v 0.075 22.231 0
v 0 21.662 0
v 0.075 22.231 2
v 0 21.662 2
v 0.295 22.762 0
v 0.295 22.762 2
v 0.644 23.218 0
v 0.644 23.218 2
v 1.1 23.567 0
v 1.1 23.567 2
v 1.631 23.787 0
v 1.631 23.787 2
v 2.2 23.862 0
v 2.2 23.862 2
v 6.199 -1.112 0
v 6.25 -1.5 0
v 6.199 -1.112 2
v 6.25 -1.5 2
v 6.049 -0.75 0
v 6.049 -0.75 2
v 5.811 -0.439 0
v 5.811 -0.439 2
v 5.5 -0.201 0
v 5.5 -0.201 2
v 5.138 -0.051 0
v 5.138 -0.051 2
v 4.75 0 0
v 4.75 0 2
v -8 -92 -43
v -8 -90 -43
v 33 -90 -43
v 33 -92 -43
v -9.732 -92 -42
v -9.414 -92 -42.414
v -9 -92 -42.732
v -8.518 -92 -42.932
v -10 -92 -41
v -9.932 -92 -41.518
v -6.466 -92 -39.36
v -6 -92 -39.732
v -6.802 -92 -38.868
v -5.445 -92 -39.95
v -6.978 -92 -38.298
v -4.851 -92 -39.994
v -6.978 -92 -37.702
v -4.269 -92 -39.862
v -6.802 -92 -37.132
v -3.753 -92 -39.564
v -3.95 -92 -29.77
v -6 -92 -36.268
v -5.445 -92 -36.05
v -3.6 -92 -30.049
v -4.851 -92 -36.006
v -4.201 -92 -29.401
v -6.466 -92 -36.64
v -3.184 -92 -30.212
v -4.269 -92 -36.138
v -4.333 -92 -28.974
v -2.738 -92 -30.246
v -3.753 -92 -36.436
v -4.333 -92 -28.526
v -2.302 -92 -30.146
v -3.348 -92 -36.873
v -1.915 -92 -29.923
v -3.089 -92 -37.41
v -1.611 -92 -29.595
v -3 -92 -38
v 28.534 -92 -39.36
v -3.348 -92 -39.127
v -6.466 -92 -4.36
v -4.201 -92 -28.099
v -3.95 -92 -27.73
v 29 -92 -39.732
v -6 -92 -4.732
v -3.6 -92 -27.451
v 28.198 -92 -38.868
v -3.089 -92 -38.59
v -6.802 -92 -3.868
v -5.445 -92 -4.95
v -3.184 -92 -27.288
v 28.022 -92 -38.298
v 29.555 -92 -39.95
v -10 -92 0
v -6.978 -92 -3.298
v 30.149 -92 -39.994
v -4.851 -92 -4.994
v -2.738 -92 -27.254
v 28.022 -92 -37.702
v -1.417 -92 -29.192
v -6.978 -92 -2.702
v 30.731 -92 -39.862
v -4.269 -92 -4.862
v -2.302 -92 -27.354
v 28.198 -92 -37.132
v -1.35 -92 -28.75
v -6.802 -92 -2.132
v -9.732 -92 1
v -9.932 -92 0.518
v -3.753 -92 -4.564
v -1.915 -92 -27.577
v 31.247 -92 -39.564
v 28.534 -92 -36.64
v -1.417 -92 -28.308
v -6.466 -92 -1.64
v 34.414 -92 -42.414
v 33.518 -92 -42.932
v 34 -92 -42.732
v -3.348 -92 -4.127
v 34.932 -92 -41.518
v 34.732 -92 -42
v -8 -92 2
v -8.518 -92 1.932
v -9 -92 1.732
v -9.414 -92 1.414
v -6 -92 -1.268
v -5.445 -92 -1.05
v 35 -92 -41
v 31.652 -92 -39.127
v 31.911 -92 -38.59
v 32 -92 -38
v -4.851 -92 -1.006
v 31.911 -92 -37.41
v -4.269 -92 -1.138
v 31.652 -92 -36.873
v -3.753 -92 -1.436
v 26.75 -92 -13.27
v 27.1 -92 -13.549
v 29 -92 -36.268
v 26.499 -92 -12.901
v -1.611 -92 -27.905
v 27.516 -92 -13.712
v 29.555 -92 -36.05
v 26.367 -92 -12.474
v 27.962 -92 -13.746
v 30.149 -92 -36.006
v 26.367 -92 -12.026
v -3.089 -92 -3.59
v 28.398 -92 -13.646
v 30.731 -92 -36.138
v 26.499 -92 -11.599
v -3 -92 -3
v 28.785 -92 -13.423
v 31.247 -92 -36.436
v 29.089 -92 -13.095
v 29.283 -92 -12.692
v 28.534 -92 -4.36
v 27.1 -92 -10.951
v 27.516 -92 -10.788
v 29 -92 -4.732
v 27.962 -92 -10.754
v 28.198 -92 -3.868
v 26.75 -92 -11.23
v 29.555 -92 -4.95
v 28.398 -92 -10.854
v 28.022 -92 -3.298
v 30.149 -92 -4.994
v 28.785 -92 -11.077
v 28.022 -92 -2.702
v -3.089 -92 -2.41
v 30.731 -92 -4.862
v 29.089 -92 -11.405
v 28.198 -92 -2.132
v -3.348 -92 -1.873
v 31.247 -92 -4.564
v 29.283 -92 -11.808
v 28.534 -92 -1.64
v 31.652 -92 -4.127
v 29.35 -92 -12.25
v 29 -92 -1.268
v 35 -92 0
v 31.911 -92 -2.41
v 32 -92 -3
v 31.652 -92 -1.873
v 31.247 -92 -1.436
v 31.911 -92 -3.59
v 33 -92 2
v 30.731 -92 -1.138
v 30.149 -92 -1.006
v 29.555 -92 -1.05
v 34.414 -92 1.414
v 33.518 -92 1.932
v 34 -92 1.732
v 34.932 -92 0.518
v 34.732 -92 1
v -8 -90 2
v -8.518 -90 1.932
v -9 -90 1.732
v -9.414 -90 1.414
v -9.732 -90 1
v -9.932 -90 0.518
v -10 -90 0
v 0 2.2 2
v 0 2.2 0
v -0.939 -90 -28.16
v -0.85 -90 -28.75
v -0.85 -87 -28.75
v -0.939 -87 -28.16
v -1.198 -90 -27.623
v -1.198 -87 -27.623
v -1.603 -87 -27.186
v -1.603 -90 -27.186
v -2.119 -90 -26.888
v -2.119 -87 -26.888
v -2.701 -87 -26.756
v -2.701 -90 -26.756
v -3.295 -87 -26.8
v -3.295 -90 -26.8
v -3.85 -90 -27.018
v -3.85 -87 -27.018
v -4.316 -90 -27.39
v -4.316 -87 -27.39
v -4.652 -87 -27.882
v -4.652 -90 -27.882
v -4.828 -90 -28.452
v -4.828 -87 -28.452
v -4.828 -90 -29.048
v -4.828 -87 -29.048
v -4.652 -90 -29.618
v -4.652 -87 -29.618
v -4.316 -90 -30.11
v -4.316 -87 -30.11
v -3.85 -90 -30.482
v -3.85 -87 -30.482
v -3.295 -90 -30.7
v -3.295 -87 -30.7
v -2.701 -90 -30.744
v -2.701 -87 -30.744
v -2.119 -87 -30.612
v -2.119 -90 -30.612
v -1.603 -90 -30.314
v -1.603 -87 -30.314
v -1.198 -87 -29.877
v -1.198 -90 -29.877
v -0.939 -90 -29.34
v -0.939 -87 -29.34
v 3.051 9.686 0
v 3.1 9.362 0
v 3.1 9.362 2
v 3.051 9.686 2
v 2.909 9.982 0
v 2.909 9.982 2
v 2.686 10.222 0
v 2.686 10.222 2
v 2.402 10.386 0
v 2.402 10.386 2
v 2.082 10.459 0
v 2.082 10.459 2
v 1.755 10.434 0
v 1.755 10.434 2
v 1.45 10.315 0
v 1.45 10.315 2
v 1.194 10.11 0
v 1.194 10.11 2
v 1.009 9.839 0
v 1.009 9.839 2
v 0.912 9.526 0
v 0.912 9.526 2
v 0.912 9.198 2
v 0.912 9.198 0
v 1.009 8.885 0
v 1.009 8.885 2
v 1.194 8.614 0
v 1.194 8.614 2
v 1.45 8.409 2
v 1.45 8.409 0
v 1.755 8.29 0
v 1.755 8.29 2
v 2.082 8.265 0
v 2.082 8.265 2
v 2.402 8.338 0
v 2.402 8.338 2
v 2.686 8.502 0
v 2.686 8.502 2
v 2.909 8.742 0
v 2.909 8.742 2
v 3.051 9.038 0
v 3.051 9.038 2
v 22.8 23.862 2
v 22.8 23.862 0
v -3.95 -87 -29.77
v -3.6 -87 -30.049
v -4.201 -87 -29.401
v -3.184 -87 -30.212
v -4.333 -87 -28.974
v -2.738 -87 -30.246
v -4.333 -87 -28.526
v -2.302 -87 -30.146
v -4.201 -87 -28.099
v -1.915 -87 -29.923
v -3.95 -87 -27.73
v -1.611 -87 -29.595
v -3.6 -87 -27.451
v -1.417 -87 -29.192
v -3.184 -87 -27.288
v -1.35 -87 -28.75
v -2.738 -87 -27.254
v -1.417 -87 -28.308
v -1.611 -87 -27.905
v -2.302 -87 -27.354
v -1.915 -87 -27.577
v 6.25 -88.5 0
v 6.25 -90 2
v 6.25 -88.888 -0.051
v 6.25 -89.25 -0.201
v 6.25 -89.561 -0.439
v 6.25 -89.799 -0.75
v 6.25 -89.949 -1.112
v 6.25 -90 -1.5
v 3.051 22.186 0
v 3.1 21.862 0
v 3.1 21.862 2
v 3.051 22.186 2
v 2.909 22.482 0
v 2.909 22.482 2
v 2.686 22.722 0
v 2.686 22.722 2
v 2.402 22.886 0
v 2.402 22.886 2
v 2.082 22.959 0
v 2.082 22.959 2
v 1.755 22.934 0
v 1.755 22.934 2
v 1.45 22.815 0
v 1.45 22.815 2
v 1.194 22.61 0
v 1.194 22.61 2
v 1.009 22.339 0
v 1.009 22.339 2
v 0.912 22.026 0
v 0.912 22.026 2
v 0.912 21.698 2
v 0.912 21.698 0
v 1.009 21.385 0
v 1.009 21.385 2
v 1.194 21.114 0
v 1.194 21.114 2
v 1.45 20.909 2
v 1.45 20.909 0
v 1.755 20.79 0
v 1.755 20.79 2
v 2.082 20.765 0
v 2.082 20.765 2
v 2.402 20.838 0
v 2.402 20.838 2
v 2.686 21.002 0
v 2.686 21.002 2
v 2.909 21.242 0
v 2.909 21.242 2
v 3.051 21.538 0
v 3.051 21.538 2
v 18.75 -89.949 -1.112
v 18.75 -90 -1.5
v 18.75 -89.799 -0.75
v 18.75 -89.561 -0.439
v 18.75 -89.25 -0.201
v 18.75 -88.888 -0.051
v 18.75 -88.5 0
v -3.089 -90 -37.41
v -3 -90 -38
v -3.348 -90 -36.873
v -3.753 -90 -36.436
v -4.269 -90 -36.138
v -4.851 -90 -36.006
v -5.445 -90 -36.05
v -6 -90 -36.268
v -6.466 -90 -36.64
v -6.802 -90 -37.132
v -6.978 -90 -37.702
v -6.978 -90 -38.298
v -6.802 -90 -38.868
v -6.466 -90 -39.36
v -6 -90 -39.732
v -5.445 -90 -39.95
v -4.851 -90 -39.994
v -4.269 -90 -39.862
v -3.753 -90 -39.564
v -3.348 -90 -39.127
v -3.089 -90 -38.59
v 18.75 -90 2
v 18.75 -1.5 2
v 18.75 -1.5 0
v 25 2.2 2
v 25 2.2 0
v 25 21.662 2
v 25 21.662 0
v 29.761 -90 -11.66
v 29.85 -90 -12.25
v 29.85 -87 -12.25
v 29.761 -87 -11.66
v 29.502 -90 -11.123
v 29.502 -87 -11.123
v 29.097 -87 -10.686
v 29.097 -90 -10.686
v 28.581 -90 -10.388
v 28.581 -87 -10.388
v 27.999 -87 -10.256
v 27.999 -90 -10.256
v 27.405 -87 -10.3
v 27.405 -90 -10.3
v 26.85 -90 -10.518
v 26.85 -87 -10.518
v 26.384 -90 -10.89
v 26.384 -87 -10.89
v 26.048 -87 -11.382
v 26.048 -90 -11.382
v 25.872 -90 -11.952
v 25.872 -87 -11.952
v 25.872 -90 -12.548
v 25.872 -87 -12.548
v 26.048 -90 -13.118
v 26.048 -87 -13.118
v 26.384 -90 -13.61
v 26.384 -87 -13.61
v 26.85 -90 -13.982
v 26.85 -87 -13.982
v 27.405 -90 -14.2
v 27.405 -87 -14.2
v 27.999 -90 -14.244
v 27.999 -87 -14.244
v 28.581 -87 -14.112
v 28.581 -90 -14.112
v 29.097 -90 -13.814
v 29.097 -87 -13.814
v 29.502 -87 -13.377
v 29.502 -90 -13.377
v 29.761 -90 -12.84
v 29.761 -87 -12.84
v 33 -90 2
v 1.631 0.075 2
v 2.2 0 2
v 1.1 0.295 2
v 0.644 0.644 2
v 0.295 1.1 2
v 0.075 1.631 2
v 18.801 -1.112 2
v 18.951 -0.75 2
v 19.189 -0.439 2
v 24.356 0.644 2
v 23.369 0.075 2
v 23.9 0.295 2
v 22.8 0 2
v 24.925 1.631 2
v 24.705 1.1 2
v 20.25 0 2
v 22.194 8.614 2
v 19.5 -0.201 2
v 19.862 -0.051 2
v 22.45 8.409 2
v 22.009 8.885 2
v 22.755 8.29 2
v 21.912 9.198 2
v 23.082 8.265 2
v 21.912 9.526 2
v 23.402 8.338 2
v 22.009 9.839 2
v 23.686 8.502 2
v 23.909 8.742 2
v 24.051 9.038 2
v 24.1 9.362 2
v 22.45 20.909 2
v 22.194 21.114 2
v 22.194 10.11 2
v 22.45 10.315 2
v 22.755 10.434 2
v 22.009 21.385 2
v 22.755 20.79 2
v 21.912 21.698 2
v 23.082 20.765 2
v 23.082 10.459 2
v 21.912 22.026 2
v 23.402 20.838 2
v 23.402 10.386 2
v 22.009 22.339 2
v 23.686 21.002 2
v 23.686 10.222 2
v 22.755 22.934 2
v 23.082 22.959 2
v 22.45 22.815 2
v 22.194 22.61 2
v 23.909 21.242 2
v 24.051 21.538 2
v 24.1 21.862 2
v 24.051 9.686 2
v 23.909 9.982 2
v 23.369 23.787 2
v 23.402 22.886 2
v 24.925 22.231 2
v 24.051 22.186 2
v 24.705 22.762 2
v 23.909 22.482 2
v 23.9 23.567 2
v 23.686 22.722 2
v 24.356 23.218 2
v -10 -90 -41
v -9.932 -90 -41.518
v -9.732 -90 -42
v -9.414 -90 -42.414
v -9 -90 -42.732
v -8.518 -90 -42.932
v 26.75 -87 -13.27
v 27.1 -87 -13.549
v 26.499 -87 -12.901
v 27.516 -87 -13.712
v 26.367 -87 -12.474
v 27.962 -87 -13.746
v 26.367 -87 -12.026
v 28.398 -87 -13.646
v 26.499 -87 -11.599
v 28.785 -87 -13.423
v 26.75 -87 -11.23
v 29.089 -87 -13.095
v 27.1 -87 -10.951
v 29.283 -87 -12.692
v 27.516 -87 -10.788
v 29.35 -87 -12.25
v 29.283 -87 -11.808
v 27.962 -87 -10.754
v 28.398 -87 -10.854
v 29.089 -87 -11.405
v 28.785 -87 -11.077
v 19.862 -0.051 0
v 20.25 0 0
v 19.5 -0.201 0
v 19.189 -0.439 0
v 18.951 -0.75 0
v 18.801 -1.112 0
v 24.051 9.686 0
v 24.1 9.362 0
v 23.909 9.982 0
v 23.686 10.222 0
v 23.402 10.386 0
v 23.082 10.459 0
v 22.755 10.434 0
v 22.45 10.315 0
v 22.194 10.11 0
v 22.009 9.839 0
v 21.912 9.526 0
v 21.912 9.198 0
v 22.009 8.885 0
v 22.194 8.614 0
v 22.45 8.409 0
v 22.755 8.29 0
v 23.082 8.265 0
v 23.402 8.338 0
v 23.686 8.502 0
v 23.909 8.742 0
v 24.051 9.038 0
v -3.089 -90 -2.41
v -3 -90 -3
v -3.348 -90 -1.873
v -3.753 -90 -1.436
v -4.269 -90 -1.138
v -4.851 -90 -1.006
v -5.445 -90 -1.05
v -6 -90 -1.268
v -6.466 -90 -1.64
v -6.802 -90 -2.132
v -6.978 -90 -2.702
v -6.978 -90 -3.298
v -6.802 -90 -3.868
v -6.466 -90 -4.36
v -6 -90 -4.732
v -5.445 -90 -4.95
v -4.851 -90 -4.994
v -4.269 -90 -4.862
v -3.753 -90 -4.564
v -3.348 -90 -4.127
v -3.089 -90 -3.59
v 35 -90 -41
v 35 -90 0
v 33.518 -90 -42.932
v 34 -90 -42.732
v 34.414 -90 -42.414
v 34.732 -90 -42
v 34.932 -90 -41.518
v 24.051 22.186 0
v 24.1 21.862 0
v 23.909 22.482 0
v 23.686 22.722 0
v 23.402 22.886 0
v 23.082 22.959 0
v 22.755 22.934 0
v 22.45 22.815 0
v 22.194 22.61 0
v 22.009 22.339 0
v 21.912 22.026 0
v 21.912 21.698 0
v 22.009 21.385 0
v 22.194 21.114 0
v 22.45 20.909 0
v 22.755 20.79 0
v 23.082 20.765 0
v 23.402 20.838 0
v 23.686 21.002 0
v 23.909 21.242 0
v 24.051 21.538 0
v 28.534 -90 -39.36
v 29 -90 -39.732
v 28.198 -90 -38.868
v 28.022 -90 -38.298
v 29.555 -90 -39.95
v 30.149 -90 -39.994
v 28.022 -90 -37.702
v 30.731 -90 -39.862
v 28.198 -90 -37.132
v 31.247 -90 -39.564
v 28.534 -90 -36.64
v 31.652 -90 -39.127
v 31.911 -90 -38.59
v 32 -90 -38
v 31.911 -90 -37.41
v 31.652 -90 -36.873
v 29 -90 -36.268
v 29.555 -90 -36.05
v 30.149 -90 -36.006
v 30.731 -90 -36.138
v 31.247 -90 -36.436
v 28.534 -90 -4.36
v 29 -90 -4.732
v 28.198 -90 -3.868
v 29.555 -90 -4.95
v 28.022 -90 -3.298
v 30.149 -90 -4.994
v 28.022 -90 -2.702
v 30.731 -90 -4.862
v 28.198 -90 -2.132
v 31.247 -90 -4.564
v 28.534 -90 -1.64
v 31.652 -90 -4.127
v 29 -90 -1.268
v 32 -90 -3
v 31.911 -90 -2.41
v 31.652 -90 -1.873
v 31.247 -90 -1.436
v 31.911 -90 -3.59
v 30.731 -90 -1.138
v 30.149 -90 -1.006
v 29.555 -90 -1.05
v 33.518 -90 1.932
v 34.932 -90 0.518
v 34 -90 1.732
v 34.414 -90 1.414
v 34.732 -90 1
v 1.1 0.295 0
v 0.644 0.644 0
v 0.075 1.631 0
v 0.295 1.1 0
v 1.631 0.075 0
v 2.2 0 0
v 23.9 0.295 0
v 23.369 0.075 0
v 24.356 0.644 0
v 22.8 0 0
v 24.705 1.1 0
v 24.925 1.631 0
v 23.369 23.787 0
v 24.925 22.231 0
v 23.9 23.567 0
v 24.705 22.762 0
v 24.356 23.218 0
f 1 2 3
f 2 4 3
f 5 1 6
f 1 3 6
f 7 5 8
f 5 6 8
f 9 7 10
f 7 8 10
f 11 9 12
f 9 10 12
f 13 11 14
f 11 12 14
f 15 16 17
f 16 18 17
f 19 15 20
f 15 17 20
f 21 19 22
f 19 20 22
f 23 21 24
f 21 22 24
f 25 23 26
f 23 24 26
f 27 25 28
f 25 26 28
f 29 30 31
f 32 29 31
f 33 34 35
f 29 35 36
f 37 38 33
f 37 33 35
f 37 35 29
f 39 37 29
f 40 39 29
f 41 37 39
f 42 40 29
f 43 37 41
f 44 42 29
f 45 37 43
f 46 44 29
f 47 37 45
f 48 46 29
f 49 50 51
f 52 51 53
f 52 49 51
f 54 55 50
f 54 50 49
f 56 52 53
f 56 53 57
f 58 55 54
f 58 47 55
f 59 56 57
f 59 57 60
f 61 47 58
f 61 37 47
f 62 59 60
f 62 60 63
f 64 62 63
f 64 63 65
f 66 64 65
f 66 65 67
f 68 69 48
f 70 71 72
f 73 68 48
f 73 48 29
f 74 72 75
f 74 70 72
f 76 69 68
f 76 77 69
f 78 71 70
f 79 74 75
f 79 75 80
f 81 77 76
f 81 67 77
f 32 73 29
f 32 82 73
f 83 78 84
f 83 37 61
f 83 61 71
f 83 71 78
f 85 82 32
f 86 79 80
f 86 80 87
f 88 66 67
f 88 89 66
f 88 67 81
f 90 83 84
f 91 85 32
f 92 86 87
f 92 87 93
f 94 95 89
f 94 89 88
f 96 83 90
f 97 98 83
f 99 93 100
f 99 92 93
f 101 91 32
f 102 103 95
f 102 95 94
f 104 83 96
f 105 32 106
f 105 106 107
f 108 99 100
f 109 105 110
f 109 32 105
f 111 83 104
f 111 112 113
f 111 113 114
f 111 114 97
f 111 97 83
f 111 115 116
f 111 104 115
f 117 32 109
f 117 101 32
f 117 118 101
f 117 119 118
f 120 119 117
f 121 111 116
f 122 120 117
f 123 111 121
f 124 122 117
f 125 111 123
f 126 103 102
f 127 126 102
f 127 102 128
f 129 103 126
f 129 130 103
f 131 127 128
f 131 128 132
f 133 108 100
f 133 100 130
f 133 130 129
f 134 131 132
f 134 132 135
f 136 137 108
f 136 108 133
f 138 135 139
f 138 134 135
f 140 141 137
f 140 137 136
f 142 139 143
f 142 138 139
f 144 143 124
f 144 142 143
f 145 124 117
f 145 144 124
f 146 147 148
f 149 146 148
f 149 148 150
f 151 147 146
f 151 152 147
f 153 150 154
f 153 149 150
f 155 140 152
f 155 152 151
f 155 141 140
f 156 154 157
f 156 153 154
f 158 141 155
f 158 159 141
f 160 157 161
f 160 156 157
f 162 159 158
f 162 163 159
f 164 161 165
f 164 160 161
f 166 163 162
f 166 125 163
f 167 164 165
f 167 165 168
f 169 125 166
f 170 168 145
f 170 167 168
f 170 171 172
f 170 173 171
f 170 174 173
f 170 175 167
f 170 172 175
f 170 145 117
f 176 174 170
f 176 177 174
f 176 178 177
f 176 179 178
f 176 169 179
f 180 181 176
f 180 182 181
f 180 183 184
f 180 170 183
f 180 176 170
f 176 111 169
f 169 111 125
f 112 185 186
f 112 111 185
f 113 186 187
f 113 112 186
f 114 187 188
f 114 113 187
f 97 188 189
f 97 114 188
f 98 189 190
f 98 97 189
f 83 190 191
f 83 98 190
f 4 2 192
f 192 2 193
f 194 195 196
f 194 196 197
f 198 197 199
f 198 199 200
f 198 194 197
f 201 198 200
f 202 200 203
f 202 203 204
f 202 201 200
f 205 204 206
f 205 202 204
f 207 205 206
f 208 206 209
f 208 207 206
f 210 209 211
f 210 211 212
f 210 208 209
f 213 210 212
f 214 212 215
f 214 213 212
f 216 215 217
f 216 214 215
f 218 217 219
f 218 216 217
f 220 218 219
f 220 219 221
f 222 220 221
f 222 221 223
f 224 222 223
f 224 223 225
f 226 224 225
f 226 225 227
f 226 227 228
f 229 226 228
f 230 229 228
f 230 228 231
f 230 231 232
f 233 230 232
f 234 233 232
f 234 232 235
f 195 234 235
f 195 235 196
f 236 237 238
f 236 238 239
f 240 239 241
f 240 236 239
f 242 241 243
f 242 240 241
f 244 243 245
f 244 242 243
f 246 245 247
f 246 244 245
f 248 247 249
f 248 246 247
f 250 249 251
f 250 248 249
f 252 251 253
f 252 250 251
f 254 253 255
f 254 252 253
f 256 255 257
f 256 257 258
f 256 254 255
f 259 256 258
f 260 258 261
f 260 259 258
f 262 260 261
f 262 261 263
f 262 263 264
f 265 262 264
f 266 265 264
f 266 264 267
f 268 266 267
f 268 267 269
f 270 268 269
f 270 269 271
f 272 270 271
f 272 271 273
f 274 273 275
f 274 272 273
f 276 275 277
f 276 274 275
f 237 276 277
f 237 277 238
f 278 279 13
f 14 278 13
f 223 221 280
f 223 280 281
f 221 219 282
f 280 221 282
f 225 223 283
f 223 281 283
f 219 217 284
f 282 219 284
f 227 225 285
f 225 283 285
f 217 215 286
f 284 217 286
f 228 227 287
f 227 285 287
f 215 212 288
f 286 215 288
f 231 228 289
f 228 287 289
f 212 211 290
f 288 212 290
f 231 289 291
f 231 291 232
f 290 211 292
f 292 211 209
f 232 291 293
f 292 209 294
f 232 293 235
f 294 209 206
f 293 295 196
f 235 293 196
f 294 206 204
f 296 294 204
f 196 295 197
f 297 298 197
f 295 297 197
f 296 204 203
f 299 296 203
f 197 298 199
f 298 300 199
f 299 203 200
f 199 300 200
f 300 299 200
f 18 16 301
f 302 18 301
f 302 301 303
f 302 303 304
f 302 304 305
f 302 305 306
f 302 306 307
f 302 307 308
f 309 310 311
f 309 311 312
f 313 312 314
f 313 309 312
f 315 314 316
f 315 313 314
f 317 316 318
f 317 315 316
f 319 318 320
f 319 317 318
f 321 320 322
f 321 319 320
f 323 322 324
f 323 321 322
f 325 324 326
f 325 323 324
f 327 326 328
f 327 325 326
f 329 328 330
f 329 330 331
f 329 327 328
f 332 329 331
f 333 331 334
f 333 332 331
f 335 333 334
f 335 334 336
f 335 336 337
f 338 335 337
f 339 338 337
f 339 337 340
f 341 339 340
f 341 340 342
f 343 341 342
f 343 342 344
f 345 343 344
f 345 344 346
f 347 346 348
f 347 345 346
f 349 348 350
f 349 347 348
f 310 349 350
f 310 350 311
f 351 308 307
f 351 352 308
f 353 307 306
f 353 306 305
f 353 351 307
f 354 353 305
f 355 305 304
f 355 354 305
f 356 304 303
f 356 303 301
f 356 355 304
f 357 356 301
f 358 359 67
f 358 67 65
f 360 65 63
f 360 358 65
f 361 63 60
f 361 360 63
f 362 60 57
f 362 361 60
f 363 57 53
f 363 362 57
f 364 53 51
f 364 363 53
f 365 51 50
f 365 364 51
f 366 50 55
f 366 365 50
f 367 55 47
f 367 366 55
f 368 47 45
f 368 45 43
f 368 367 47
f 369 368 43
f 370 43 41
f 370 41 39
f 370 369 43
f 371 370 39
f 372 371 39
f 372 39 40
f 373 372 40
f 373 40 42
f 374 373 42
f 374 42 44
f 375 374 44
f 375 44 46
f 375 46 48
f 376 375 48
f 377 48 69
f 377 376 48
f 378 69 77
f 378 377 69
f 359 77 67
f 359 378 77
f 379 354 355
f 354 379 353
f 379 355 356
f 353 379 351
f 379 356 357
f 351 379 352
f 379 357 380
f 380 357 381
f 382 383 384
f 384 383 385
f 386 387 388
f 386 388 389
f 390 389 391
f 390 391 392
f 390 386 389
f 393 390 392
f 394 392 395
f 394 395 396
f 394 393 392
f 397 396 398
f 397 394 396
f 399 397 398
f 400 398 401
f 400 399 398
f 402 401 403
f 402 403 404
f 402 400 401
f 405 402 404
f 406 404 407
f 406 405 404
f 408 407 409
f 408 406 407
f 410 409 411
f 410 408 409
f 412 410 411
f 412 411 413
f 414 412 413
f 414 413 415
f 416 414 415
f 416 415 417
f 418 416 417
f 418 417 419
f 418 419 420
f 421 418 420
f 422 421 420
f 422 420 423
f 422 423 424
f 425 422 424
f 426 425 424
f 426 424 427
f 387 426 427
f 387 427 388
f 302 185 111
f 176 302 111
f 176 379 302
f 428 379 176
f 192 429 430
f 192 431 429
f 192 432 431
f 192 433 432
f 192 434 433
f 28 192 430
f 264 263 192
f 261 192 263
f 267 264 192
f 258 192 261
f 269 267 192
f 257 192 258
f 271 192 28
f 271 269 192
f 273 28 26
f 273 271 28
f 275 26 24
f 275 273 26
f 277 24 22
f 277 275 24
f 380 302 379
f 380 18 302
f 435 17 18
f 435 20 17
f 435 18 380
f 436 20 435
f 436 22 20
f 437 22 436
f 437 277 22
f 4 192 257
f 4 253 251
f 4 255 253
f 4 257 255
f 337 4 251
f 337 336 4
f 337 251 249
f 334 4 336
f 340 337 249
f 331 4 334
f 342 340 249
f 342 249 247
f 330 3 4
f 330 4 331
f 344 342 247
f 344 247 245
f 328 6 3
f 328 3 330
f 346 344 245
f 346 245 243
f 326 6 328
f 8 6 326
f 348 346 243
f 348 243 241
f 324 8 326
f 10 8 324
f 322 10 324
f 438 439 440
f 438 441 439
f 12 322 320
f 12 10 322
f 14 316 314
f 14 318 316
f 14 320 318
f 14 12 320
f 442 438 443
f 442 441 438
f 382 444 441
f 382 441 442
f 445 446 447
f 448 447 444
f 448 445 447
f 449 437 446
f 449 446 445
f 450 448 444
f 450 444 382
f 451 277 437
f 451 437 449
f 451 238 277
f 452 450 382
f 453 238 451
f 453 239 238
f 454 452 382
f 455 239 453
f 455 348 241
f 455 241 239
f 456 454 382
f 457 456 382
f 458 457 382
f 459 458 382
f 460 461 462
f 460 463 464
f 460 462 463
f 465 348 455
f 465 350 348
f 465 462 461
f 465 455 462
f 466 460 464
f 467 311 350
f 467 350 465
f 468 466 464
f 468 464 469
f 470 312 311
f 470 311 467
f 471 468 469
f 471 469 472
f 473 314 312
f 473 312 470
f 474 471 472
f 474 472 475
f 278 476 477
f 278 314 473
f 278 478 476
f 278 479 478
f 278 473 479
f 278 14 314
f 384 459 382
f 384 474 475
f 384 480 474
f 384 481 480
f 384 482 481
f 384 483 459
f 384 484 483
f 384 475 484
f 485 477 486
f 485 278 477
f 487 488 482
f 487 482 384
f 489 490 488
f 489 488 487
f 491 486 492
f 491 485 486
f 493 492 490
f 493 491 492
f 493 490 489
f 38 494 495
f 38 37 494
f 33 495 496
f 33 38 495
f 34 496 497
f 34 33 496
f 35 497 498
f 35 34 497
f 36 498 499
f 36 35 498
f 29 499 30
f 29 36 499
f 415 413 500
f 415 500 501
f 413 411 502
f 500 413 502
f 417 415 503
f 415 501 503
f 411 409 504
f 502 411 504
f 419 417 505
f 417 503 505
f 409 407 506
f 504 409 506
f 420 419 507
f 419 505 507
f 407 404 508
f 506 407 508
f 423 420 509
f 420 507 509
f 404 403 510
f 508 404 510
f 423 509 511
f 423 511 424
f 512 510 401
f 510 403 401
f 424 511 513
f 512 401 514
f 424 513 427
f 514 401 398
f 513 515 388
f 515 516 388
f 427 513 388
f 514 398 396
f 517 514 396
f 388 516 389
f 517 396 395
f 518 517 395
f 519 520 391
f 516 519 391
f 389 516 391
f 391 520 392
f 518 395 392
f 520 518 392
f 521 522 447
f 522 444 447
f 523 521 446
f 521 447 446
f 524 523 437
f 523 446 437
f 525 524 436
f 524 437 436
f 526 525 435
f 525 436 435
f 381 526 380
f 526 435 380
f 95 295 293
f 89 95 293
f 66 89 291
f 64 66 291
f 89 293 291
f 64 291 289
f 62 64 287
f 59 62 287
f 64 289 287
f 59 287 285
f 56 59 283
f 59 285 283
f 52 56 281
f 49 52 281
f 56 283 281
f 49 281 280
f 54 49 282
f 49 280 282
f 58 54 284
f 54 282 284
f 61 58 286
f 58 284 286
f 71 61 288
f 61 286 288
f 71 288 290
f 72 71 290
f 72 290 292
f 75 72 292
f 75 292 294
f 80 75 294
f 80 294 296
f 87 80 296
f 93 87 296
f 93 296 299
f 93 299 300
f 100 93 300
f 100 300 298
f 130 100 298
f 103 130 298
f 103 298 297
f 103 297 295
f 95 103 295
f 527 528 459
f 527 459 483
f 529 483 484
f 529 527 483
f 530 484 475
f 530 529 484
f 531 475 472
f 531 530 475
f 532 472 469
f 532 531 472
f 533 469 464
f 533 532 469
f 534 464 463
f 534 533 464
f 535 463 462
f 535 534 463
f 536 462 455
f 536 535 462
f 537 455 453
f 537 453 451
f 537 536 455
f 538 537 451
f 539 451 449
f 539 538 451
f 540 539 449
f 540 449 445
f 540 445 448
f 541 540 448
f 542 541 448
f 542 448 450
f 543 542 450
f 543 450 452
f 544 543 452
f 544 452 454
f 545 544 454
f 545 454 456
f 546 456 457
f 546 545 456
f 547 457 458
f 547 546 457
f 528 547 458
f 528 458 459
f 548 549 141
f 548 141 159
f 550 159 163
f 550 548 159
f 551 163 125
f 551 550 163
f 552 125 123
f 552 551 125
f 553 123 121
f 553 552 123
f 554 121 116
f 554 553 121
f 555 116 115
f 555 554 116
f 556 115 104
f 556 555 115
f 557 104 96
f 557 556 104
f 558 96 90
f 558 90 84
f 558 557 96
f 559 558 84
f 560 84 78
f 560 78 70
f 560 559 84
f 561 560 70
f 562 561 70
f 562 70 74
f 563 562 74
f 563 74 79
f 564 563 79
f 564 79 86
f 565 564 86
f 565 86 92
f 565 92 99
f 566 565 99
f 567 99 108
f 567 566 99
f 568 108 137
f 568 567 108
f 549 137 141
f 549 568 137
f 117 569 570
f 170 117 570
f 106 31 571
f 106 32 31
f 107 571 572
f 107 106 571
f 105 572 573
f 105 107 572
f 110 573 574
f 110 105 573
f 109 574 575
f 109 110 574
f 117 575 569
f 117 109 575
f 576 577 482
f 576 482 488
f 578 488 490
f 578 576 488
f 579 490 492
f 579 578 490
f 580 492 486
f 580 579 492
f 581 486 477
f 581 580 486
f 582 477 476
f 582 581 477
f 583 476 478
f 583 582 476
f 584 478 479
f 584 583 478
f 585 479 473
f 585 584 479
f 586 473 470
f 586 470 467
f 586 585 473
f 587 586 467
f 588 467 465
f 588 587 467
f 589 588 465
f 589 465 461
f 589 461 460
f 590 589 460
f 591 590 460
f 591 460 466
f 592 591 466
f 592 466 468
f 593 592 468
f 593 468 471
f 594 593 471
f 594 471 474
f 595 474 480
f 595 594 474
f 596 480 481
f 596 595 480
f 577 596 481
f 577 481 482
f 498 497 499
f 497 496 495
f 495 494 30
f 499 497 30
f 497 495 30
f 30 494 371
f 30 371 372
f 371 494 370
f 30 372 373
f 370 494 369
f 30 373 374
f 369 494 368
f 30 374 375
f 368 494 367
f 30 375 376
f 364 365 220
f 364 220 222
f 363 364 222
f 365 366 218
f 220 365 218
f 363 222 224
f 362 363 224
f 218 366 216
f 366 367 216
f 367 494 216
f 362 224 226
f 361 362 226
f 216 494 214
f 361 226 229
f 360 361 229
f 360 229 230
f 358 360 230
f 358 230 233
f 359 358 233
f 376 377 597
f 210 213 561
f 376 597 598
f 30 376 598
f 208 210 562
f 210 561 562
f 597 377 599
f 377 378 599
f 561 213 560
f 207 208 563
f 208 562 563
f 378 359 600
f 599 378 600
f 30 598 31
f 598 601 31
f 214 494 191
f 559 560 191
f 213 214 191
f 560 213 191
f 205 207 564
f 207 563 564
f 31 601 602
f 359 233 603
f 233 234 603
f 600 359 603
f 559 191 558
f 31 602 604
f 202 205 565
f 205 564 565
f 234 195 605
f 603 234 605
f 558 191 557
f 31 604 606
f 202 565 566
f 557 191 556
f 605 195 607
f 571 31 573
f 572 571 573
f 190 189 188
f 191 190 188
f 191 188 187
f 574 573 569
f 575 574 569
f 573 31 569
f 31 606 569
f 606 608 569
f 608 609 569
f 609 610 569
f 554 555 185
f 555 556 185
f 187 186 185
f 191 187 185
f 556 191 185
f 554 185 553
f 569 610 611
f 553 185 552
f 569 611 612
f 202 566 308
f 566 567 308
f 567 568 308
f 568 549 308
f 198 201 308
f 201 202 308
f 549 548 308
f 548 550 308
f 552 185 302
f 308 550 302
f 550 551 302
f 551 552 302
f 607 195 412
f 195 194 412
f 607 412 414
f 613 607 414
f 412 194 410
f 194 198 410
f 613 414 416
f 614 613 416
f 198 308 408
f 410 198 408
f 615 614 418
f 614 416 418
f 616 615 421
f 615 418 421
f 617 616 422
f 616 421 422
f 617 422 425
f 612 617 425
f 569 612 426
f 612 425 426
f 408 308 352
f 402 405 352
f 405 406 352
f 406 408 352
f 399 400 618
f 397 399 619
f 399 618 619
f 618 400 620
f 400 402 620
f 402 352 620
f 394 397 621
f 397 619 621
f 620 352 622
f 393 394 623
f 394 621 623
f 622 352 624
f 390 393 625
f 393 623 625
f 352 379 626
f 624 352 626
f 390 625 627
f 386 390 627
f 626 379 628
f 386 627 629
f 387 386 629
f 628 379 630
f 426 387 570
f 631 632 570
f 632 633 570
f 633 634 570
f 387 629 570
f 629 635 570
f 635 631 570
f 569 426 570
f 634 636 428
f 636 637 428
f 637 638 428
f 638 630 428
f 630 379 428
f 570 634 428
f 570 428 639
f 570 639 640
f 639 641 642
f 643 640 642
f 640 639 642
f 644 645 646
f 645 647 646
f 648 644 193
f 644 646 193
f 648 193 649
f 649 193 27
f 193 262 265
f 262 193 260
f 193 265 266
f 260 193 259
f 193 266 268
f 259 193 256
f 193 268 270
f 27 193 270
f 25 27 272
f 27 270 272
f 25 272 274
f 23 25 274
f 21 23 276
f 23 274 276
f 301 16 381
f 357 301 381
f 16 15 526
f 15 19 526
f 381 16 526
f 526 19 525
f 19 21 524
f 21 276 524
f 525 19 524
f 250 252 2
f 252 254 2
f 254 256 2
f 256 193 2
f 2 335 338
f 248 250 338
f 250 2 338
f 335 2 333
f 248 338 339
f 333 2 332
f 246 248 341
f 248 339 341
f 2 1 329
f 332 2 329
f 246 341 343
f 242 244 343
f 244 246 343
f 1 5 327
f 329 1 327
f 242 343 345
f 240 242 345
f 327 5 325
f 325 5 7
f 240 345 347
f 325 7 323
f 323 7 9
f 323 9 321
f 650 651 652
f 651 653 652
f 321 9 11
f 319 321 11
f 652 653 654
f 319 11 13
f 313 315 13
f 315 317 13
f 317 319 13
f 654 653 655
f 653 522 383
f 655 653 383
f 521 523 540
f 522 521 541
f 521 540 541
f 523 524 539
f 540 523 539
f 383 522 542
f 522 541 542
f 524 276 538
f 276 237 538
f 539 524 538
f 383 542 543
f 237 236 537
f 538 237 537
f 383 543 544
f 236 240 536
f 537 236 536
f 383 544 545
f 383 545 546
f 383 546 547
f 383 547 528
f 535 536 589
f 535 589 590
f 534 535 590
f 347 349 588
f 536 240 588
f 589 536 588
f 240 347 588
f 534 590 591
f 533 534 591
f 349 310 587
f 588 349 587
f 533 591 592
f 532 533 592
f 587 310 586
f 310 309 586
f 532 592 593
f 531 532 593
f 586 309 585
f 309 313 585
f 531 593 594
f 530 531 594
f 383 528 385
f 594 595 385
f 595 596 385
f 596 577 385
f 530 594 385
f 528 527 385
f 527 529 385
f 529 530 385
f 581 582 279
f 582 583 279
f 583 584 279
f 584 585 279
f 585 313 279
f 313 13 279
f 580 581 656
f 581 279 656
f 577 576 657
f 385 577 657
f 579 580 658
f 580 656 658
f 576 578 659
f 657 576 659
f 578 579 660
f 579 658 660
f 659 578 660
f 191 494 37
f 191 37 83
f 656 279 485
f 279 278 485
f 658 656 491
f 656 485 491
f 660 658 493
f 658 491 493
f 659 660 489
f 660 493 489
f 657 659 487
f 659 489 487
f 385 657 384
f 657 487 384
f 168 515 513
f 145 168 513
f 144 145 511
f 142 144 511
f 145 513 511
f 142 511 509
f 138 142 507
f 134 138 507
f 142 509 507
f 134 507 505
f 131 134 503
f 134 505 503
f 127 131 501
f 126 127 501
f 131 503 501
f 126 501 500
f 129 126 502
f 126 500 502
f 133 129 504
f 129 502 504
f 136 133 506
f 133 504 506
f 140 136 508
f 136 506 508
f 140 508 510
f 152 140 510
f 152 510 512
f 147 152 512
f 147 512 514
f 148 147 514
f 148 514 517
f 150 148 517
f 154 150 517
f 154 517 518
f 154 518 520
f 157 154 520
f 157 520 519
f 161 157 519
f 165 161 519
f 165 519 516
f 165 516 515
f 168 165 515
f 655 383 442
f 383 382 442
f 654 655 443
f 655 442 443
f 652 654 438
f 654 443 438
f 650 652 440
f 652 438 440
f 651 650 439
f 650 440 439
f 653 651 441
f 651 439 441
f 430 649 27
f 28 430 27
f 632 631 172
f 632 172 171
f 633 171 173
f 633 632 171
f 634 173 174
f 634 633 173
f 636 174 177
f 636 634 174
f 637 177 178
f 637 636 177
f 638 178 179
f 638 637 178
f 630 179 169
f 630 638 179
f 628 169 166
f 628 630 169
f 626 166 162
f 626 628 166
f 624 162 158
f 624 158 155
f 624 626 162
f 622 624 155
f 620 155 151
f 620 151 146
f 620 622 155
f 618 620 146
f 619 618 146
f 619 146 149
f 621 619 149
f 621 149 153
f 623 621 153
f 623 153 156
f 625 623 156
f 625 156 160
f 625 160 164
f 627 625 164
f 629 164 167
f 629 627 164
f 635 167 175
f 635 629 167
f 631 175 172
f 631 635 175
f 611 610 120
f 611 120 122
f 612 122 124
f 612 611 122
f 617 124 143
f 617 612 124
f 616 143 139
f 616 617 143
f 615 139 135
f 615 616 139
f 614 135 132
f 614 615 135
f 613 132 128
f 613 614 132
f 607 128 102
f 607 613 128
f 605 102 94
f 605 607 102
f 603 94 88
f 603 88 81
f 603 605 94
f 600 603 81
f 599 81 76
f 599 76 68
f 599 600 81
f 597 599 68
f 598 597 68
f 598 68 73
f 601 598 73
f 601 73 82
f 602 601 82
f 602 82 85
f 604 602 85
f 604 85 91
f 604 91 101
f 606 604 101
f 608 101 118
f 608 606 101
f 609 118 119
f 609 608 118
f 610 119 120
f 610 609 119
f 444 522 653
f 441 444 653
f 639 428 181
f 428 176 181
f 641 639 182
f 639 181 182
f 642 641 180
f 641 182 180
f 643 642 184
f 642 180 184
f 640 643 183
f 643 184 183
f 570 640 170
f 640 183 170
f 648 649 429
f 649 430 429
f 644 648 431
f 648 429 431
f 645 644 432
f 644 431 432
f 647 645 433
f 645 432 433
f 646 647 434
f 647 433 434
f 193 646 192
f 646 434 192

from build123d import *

# Parameters (mm, degrees)
SKETCH1_R           = 1.1
BOSS_EXTRUDE1_DEPTH = 2
FILLET1_R           = 2.2
FILLET2_R           = 2.2
FILLET3_R           = 2.2
FILLET5_R           = 2.2
FILLET6_R           = 1.5
FILLET7_R           = 1.5
SKETCH5_W           = 45
SKETCH5_H           = 45
SKETCH5_R           = 2
BOSS_EXTRUDE4_DEPTH = 2
FILLET17_R          = 2
FILLET18_R          = 2
FILLET19_R          = 2
FILLET20_R          = 2
FILLET21_R          = 1.5
SKETCH7_R           = 2
BOSS_EXTRUDE8_DEPTH = 5
SKETCH10_R          = 1.5
CUT_EXTRUDE4_DEPTH  = 6


with BuildPart() as part:
    # Sketch1 → Boss-Extrude1 (new body)
    with BuildSketch(Plane.XY):
        Polygon((6.25, 0), (6.25, -90), (18.75, -90), (18.75, 0), (25, 0), (25, 23.862), (0, 23.862), (0, 0), align=None)
        with Locations((2, 21.862)):
            Circle(SKETCH1_R, mode=Mode.SUBTRACT)
        with Locations((23, 21.862)):
            Circle(SKETCH1_R, mode=Mode.SUBTRACT)
        with Locations((2, 9.362)):
            Circle(SKETCH1_R, mode=Mode.SUBTRACT)
        with Locations((23, 9.362)):
            Circle(SKETCH1_R, mode=Mode.SUBTRACT)
    extrude(amount=BOSS_EXTRUDE1_DEPTH)

    # Fillet1
    fillet1_edges = [part.edges().sort_by_distance(p)[0] for p in [
        (0, 0, 1),
    ]]
    fillet(fillet1_edges, radius=FILLET1_R)

    # Fillet2
    fillet2_edges = [part.edges().sort_by_distance(p)[0] for p in [
        (0, 23.862, 1),
    ]]
    fillet(fillet2_edges, radius=FILLET2_R)

    # Fillet3
    fillet3_edges = [part.edges().sort_by_distance(p)[0] for p in [
        (25, 23.862, 1),
    ]]
    fillet(fillet3_edges, radius=FILLET3_R)

    # Fillet5
    fillet5_edges = [part.edges().sort_by_distance(p)[0] for p in [
        (25, 0, 1),
    ]]
    fillet(fillet5_edges, radius=FILLET5_R)

    # Fillet6
    fillet6_edges = [part.edges().sort_by_distance(p)[0] for p in [
        (18.75, 0, 1),
    ]]
    fillet(fillet6_edges, radius=FILLET6_R)

    # Fillet7
    fillet7_edges = [part.edges().sort_by_distance(p)[0] for p in [
        (6.25, 0, 1),
    ]]
    fillet(fillet7_edges, radius=FILLET7_R)

    # Sketch5 → Boss-Extrude4 (add)
    with BuildSketch(Plane.XZ.offset(90)):
        with Locations((12.5, -20.5)):
            Rectangle(SKETCH5_W, SKETCH5_H)
        with Locations((-5, -3)):
            Circle(SKETCH5_R, mode=Mode.SUBTRACT)
        with Locations((-5, -38)):
            Circle(SKETCH5_R, mode=Mode.SUBTRACT)
        with Locations((30, -3)):
            Circle(SKETCH5_R, mode=Mode.SUBTRACT)
        with Locations((30, -38)):
            Circle(SKETCH5_R, mode=Mode.SUBTRACT)
    extrude(amount=BOSS_EXTRUDE4_DEPTH)

    # Fillet17
    fillet17_edges = [part.edges().sort_by_distance(p)[0] for p in [
        (35, -91, 2),
    ]]
    fillet(fillet17_edges, radius=FILLET17_R)

    # Fillet18
    fillet18_edges = [part.edges().sort_by_distance(p)[0] for p in [
        (-10, -91, 2),
    ]]
    fillet(fillet18_edges, radius=FILLET18_R)

    # Fillet19
    fillet19_edges = [part.edges().sort_by_distance(p)[0] for p in [
        (-10, -91, -43),
    ]]
    fillet(fillet19_edges, radius=FILLET19_R)

    # Fillet20
    fillet20_edges = [part.edges().sort_by_distance(p)[0] for p in [
        (35, -91, -43),
    ]]
    fillet(fillet20_edges, radius=FILLET20_R)

    # Fillet21
    fillet21_edges = [part.edges().sort_by_distance(p)[0] for p in [
        (12.5, -90, 0),
    ]]
    fillet(fillet21_edges, radius=FILLET21_R)

    # Sketch7 → Boss-Extrude8 (add)
    with BuildSketch(Plane.XZ.offset(92)):
        with Locations((27.85, -12.25)):
            Circle(SKETCH7_R)
        with Locations((-2.85, -28.75)):
            Circle(SKETCH7_R)
    extrude(amount=-BOSS_EXTRUDE8_DEPTH)

    # Sketch10 → Cut-Extrude4 (cut, through all)
    with BuildSketch(Plane(origin=(0, -87, 0), x_dir=(1, 0, 0), z_dir=(0, 1, 0))):
        with Locations((27.85, 12.25)):
            Circle(SKETCH10_R)
        with Locations((-2.85, 28.75)):
            Circle(SKETCH10_R)
    extrude(amount=-CUT_EXTRUDE4_DEPTH, mode=Mode.SUBTRACT)


solid = part.part
